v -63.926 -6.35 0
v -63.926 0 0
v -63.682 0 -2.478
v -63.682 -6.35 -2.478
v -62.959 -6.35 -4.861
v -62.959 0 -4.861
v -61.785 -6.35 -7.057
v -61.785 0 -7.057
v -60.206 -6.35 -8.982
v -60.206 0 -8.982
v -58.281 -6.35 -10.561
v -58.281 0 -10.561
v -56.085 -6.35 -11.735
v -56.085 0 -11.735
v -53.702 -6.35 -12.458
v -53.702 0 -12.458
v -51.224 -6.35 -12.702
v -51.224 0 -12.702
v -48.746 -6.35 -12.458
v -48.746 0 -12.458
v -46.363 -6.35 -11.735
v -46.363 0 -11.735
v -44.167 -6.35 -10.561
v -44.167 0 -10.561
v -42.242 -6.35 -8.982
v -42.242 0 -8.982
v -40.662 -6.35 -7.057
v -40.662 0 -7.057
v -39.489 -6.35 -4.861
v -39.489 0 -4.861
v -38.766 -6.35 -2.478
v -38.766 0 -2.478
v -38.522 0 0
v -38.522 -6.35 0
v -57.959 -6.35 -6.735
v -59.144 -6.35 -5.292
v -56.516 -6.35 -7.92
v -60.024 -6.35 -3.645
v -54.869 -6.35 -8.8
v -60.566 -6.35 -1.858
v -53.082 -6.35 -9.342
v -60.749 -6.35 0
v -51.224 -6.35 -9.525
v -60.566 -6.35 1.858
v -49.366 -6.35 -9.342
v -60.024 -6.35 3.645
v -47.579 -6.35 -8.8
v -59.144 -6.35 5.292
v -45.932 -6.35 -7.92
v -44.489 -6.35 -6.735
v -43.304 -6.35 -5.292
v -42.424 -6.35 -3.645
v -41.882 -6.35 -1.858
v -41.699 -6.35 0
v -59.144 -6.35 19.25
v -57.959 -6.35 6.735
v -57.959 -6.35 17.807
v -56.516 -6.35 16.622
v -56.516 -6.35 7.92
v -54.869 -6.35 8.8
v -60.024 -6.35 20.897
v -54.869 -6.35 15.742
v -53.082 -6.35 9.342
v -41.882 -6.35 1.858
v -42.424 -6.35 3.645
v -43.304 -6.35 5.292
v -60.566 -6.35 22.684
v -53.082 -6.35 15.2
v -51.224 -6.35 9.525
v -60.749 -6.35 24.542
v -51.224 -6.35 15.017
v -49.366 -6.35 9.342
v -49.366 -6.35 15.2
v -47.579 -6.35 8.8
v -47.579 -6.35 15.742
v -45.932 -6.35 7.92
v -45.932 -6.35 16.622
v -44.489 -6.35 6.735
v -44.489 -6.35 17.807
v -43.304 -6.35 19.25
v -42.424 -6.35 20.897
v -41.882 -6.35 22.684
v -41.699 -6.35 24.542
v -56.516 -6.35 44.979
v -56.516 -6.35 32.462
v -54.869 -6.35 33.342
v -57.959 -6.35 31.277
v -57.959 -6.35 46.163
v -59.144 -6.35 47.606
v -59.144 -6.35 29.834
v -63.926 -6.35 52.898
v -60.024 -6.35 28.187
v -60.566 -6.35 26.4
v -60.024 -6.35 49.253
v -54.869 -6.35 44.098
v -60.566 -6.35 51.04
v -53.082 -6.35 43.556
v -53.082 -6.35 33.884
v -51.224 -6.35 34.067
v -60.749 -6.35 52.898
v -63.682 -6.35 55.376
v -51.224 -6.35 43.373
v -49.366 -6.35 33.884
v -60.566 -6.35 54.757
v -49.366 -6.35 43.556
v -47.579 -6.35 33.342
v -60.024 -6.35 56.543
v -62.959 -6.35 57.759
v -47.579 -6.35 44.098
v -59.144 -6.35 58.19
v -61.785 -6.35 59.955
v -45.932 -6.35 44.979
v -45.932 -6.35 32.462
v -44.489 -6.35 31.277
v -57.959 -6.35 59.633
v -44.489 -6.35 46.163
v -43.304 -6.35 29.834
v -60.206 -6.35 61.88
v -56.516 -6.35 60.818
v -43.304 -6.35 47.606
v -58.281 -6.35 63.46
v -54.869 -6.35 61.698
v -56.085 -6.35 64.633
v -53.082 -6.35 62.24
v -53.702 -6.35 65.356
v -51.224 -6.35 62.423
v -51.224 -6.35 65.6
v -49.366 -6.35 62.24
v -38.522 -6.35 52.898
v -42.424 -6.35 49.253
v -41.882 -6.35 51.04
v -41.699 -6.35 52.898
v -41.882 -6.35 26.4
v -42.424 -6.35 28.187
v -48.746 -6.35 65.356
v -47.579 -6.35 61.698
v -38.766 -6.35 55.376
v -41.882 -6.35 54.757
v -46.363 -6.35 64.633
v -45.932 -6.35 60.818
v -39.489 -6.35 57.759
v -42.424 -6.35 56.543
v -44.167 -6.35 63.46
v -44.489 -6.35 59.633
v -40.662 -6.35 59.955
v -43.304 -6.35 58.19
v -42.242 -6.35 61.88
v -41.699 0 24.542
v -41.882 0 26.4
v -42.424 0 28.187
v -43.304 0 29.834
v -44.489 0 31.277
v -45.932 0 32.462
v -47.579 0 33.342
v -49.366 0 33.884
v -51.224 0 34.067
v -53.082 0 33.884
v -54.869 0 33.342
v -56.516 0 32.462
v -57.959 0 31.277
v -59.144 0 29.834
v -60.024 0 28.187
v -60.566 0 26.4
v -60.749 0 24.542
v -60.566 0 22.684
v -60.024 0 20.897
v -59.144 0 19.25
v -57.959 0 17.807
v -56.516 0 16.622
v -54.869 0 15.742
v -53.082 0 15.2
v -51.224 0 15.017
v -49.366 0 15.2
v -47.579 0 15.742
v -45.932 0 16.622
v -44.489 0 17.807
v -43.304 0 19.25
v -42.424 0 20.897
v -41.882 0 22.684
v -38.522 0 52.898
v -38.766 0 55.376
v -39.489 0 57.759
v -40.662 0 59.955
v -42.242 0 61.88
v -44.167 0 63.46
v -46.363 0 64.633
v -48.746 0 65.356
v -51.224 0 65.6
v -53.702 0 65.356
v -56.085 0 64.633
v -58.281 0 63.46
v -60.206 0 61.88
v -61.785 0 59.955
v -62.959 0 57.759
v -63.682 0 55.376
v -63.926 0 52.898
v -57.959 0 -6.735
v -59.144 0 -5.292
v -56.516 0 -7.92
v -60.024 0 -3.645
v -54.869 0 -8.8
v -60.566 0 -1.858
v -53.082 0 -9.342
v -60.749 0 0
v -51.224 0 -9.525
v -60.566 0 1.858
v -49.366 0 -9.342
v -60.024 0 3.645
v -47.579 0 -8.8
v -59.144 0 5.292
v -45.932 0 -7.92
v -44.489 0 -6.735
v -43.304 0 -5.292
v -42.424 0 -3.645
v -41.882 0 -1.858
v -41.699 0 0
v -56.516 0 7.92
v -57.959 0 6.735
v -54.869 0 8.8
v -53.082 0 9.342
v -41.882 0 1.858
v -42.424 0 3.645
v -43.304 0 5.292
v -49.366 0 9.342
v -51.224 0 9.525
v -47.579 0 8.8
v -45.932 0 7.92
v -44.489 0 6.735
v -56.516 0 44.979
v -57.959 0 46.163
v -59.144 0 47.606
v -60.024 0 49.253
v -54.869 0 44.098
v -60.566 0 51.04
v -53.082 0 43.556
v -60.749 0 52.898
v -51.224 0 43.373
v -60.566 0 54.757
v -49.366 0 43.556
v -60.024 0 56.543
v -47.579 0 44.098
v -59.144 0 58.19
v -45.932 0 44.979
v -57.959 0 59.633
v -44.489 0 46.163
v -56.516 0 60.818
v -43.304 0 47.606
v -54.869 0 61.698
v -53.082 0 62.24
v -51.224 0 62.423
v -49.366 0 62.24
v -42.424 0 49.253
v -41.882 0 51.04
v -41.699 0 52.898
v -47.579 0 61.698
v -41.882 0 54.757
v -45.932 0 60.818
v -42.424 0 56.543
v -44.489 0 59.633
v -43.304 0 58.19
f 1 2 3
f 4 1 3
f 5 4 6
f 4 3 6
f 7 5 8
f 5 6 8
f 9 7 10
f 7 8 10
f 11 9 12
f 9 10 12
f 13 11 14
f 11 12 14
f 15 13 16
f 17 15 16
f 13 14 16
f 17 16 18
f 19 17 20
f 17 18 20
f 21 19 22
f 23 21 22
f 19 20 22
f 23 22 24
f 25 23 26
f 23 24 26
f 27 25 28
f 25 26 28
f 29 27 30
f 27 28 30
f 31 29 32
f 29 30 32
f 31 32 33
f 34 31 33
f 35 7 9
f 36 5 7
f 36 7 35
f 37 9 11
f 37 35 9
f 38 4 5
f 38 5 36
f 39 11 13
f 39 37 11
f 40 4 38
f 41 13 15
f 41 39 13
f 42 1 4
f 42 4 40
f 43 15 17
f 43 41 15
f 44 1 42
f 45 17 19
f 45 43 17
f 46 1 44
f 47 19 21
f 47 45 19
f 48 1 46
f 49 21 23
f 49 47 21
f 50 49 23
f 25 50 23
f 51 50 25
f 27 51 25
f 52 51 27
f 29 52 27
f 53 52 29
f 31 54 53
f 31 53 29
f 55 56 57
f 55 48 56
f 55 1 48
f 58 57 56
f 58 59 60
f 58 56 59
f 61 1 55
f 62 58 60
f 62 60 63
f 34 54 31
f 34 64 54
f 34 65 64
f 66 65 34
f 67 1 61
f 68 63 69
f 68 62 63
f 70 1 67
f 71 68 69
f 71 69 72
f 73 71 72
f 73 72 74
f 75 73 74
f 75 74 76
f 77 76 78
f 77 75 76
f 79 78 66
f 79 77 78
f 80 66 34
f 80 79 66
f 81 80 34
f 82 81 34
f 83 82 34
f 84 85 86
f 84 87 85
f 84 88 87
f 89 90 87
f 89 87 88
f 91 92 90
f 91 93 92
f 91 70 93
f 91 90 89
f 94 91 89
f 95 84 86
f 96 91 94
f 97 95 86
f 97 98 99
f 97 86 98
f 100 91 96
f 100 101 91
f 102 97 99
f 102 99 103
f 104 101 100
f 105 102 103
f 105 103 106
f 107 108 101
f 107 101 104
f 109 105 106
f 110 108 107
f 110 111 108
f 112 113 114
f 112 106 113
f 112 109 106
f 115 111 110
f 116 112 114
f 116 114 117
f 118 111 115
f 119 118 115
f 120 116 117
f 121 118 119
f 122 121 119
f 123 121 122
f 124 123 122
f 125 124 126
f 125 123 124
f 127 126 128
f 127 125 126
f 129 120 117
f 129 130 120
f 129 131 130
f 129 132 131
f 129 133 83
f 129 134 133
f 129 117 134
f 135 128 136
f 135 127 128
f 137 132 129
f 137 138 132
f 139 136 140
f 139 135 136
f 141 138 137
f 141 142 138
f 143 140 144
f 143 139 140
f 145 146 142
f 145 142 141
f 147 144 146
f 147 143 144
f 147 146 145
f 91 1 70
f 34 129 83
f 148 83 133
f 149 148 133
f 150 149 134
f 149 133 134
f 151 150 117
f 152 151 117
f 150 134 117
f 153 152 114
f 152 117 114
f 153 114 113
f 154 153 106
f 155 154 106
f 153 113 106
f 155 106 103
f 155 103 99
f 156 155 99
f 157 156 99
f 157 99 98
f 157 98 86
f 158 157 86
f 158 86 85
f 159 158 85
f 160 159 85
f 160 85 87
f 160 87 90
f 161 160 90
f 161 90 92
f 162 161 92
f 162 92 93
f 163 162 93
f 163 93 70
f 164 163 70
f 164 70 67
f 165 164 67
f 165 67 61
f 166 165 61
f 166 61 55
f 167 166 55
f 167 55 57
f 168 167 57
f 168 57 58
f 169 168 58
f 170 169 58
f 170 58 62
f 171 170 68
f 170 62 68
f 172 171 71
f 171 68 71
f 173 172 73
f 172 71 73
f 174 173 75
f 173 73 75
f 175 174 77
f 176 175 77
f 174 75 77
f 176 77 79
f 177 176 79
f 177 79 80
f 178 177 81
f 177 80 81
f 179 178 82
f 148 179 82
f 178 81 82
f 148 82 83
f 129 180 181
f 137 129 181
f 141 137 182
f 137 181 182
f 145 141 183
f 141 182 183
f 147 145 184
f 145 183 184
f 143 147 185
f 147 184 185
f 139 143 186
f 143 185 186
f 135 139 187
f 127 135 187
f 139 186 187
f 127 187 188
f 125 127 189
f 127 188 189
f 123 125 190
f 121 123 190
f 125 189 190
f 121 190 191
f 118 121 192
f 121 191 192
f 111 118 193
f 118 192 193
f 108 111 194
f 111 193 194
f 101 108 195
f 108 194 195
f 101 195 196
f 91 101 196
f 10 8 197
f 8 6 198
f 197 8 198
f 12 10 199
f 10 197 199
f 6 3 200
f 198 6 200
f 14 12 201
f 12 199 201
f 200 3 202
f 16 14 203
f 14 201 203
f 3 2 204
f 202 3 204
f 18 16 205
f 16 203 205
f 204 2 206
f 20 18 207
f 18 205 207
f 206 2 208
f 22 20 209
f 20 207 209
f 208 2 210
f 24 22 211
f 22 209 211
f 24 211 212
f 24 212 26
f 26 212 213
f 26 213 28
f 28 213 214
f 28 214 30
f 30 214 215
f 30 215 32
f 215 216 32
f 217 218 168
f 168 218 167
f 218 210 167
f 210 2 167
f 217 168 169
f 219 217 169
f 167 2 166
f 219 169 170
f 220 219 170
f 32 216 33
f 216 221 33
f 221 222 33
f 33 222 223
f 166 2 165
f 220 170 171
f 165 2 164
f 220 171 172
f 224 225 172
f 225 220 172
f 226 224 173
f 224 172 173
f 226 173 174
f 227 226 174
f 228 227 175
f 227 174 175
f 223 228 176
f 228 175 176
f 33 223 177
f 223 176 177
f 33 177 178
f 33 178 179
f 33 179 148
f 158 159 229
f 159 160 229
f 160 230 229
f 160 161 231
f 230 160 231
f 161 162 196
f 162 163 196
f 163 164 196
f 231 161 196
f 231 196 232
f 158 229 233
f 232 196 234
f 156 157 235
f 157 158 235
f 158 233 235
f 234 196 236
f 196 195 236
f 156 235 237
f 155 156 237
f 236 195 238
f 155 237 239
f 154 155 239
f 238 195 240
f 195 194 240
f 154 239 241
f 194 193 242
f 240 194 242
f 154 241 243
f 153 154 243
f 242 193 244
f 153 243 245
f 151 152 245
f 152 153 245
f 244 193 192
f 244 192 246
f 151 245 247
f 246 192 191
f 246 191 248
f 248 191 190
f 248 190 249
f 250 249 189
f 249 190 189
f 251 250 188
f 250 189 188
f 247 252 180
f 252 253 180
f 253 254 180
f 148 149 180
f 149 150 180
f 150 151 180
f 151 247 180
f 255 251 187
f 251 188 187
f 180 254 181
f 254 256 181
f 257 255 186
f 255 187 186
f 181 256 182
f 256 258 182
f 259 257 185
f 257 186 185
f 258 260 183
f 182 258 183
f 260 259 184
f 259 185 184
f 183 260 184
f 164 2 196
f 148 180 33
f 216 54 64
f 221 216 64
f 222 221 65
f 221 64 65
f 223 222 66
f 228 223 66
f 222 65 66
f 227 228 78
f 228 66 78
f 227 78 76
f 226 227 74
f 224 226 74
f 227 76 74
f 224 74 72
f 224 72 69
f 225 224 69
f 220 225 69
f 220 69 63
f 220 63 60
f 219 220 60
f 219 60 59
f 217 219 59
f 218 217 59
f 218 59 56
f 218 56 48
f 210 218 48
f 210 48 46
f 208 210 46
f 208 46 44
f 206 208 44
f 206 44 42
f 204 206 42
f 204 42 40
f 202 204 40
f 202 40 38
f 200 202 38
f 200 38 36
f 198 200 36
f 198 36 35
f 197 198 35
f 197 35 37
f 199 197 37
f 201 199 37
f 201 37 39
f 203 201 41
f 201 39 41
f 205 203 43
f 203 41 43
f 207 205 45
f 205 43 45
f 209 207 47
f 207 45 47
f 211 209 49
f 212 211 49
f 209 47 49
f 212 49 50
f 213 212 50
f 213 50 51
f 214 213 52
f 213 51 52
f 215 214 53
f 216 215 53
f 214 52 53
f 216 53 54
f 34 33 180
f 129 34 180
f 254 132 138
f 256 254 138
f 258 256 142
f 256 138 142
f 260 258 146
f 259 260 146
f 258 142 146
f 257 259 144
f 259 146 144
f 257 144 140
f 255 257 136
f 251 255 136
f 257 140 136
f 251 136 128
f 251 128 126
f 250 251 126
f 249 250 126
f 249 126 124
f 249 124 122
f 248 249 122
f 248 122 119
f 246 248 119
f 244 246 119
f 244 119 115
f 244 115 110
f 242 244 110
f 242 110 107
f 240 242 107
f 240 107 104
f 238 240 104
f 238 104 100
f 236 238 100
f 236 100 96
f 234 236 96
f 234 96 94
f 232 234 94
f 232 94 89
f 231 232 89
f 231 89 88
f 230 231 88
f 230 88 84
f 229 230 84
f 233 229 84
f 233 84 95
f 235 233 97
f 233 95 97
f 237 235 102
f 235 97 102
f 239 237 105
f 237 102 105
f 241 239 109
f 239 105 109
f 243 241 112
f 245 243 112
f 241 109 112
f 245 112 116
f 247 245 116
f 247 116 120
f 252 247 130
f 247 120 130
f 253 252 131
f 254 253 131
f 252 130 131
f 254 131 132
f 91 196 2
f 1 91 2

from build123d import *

# Parameters (mm, degrees)
F1_DEPTH = 6.35
F2_R     = 9.525
F3_DEPTH = 25.4


with BuildPart() as f1:
    # F0 (on Front) → F1 (new body)
    with BuildSketch(Plane.XZ):
        with BuildLine():
            ThreePointArc((-38.521796, 52.898269), (-51.223841, 65.600313), (-63.925885, 52.898269))
            Line((-63.925885, 52.898269), (-63.925885, 0))
            ThreePointArc((-63.925885, 0), (-51.223841, -12.702044), (-38.521796, 0))
            Line((-38.521796, 0), (-38.521796, 52.898269))
        make_face()
    extrude(amount=F1_DEPTH)

    # F2 (on face) → F3 (cut)
    with BuildSketch(Plane.XZ.offset(6.35)):
        with Locations((-51.223841, 24.542077)):
            Circle(F2_R)
        with Locations((-51.223841, 0)):
            Circle(F2_R)
        with Locations((-51.223841, 52.898269)):
            Circle(F2_R)
    extrude(amount=-F3_DEPTH, mode=Mode.SUBTRACT)


solid = f1.part
